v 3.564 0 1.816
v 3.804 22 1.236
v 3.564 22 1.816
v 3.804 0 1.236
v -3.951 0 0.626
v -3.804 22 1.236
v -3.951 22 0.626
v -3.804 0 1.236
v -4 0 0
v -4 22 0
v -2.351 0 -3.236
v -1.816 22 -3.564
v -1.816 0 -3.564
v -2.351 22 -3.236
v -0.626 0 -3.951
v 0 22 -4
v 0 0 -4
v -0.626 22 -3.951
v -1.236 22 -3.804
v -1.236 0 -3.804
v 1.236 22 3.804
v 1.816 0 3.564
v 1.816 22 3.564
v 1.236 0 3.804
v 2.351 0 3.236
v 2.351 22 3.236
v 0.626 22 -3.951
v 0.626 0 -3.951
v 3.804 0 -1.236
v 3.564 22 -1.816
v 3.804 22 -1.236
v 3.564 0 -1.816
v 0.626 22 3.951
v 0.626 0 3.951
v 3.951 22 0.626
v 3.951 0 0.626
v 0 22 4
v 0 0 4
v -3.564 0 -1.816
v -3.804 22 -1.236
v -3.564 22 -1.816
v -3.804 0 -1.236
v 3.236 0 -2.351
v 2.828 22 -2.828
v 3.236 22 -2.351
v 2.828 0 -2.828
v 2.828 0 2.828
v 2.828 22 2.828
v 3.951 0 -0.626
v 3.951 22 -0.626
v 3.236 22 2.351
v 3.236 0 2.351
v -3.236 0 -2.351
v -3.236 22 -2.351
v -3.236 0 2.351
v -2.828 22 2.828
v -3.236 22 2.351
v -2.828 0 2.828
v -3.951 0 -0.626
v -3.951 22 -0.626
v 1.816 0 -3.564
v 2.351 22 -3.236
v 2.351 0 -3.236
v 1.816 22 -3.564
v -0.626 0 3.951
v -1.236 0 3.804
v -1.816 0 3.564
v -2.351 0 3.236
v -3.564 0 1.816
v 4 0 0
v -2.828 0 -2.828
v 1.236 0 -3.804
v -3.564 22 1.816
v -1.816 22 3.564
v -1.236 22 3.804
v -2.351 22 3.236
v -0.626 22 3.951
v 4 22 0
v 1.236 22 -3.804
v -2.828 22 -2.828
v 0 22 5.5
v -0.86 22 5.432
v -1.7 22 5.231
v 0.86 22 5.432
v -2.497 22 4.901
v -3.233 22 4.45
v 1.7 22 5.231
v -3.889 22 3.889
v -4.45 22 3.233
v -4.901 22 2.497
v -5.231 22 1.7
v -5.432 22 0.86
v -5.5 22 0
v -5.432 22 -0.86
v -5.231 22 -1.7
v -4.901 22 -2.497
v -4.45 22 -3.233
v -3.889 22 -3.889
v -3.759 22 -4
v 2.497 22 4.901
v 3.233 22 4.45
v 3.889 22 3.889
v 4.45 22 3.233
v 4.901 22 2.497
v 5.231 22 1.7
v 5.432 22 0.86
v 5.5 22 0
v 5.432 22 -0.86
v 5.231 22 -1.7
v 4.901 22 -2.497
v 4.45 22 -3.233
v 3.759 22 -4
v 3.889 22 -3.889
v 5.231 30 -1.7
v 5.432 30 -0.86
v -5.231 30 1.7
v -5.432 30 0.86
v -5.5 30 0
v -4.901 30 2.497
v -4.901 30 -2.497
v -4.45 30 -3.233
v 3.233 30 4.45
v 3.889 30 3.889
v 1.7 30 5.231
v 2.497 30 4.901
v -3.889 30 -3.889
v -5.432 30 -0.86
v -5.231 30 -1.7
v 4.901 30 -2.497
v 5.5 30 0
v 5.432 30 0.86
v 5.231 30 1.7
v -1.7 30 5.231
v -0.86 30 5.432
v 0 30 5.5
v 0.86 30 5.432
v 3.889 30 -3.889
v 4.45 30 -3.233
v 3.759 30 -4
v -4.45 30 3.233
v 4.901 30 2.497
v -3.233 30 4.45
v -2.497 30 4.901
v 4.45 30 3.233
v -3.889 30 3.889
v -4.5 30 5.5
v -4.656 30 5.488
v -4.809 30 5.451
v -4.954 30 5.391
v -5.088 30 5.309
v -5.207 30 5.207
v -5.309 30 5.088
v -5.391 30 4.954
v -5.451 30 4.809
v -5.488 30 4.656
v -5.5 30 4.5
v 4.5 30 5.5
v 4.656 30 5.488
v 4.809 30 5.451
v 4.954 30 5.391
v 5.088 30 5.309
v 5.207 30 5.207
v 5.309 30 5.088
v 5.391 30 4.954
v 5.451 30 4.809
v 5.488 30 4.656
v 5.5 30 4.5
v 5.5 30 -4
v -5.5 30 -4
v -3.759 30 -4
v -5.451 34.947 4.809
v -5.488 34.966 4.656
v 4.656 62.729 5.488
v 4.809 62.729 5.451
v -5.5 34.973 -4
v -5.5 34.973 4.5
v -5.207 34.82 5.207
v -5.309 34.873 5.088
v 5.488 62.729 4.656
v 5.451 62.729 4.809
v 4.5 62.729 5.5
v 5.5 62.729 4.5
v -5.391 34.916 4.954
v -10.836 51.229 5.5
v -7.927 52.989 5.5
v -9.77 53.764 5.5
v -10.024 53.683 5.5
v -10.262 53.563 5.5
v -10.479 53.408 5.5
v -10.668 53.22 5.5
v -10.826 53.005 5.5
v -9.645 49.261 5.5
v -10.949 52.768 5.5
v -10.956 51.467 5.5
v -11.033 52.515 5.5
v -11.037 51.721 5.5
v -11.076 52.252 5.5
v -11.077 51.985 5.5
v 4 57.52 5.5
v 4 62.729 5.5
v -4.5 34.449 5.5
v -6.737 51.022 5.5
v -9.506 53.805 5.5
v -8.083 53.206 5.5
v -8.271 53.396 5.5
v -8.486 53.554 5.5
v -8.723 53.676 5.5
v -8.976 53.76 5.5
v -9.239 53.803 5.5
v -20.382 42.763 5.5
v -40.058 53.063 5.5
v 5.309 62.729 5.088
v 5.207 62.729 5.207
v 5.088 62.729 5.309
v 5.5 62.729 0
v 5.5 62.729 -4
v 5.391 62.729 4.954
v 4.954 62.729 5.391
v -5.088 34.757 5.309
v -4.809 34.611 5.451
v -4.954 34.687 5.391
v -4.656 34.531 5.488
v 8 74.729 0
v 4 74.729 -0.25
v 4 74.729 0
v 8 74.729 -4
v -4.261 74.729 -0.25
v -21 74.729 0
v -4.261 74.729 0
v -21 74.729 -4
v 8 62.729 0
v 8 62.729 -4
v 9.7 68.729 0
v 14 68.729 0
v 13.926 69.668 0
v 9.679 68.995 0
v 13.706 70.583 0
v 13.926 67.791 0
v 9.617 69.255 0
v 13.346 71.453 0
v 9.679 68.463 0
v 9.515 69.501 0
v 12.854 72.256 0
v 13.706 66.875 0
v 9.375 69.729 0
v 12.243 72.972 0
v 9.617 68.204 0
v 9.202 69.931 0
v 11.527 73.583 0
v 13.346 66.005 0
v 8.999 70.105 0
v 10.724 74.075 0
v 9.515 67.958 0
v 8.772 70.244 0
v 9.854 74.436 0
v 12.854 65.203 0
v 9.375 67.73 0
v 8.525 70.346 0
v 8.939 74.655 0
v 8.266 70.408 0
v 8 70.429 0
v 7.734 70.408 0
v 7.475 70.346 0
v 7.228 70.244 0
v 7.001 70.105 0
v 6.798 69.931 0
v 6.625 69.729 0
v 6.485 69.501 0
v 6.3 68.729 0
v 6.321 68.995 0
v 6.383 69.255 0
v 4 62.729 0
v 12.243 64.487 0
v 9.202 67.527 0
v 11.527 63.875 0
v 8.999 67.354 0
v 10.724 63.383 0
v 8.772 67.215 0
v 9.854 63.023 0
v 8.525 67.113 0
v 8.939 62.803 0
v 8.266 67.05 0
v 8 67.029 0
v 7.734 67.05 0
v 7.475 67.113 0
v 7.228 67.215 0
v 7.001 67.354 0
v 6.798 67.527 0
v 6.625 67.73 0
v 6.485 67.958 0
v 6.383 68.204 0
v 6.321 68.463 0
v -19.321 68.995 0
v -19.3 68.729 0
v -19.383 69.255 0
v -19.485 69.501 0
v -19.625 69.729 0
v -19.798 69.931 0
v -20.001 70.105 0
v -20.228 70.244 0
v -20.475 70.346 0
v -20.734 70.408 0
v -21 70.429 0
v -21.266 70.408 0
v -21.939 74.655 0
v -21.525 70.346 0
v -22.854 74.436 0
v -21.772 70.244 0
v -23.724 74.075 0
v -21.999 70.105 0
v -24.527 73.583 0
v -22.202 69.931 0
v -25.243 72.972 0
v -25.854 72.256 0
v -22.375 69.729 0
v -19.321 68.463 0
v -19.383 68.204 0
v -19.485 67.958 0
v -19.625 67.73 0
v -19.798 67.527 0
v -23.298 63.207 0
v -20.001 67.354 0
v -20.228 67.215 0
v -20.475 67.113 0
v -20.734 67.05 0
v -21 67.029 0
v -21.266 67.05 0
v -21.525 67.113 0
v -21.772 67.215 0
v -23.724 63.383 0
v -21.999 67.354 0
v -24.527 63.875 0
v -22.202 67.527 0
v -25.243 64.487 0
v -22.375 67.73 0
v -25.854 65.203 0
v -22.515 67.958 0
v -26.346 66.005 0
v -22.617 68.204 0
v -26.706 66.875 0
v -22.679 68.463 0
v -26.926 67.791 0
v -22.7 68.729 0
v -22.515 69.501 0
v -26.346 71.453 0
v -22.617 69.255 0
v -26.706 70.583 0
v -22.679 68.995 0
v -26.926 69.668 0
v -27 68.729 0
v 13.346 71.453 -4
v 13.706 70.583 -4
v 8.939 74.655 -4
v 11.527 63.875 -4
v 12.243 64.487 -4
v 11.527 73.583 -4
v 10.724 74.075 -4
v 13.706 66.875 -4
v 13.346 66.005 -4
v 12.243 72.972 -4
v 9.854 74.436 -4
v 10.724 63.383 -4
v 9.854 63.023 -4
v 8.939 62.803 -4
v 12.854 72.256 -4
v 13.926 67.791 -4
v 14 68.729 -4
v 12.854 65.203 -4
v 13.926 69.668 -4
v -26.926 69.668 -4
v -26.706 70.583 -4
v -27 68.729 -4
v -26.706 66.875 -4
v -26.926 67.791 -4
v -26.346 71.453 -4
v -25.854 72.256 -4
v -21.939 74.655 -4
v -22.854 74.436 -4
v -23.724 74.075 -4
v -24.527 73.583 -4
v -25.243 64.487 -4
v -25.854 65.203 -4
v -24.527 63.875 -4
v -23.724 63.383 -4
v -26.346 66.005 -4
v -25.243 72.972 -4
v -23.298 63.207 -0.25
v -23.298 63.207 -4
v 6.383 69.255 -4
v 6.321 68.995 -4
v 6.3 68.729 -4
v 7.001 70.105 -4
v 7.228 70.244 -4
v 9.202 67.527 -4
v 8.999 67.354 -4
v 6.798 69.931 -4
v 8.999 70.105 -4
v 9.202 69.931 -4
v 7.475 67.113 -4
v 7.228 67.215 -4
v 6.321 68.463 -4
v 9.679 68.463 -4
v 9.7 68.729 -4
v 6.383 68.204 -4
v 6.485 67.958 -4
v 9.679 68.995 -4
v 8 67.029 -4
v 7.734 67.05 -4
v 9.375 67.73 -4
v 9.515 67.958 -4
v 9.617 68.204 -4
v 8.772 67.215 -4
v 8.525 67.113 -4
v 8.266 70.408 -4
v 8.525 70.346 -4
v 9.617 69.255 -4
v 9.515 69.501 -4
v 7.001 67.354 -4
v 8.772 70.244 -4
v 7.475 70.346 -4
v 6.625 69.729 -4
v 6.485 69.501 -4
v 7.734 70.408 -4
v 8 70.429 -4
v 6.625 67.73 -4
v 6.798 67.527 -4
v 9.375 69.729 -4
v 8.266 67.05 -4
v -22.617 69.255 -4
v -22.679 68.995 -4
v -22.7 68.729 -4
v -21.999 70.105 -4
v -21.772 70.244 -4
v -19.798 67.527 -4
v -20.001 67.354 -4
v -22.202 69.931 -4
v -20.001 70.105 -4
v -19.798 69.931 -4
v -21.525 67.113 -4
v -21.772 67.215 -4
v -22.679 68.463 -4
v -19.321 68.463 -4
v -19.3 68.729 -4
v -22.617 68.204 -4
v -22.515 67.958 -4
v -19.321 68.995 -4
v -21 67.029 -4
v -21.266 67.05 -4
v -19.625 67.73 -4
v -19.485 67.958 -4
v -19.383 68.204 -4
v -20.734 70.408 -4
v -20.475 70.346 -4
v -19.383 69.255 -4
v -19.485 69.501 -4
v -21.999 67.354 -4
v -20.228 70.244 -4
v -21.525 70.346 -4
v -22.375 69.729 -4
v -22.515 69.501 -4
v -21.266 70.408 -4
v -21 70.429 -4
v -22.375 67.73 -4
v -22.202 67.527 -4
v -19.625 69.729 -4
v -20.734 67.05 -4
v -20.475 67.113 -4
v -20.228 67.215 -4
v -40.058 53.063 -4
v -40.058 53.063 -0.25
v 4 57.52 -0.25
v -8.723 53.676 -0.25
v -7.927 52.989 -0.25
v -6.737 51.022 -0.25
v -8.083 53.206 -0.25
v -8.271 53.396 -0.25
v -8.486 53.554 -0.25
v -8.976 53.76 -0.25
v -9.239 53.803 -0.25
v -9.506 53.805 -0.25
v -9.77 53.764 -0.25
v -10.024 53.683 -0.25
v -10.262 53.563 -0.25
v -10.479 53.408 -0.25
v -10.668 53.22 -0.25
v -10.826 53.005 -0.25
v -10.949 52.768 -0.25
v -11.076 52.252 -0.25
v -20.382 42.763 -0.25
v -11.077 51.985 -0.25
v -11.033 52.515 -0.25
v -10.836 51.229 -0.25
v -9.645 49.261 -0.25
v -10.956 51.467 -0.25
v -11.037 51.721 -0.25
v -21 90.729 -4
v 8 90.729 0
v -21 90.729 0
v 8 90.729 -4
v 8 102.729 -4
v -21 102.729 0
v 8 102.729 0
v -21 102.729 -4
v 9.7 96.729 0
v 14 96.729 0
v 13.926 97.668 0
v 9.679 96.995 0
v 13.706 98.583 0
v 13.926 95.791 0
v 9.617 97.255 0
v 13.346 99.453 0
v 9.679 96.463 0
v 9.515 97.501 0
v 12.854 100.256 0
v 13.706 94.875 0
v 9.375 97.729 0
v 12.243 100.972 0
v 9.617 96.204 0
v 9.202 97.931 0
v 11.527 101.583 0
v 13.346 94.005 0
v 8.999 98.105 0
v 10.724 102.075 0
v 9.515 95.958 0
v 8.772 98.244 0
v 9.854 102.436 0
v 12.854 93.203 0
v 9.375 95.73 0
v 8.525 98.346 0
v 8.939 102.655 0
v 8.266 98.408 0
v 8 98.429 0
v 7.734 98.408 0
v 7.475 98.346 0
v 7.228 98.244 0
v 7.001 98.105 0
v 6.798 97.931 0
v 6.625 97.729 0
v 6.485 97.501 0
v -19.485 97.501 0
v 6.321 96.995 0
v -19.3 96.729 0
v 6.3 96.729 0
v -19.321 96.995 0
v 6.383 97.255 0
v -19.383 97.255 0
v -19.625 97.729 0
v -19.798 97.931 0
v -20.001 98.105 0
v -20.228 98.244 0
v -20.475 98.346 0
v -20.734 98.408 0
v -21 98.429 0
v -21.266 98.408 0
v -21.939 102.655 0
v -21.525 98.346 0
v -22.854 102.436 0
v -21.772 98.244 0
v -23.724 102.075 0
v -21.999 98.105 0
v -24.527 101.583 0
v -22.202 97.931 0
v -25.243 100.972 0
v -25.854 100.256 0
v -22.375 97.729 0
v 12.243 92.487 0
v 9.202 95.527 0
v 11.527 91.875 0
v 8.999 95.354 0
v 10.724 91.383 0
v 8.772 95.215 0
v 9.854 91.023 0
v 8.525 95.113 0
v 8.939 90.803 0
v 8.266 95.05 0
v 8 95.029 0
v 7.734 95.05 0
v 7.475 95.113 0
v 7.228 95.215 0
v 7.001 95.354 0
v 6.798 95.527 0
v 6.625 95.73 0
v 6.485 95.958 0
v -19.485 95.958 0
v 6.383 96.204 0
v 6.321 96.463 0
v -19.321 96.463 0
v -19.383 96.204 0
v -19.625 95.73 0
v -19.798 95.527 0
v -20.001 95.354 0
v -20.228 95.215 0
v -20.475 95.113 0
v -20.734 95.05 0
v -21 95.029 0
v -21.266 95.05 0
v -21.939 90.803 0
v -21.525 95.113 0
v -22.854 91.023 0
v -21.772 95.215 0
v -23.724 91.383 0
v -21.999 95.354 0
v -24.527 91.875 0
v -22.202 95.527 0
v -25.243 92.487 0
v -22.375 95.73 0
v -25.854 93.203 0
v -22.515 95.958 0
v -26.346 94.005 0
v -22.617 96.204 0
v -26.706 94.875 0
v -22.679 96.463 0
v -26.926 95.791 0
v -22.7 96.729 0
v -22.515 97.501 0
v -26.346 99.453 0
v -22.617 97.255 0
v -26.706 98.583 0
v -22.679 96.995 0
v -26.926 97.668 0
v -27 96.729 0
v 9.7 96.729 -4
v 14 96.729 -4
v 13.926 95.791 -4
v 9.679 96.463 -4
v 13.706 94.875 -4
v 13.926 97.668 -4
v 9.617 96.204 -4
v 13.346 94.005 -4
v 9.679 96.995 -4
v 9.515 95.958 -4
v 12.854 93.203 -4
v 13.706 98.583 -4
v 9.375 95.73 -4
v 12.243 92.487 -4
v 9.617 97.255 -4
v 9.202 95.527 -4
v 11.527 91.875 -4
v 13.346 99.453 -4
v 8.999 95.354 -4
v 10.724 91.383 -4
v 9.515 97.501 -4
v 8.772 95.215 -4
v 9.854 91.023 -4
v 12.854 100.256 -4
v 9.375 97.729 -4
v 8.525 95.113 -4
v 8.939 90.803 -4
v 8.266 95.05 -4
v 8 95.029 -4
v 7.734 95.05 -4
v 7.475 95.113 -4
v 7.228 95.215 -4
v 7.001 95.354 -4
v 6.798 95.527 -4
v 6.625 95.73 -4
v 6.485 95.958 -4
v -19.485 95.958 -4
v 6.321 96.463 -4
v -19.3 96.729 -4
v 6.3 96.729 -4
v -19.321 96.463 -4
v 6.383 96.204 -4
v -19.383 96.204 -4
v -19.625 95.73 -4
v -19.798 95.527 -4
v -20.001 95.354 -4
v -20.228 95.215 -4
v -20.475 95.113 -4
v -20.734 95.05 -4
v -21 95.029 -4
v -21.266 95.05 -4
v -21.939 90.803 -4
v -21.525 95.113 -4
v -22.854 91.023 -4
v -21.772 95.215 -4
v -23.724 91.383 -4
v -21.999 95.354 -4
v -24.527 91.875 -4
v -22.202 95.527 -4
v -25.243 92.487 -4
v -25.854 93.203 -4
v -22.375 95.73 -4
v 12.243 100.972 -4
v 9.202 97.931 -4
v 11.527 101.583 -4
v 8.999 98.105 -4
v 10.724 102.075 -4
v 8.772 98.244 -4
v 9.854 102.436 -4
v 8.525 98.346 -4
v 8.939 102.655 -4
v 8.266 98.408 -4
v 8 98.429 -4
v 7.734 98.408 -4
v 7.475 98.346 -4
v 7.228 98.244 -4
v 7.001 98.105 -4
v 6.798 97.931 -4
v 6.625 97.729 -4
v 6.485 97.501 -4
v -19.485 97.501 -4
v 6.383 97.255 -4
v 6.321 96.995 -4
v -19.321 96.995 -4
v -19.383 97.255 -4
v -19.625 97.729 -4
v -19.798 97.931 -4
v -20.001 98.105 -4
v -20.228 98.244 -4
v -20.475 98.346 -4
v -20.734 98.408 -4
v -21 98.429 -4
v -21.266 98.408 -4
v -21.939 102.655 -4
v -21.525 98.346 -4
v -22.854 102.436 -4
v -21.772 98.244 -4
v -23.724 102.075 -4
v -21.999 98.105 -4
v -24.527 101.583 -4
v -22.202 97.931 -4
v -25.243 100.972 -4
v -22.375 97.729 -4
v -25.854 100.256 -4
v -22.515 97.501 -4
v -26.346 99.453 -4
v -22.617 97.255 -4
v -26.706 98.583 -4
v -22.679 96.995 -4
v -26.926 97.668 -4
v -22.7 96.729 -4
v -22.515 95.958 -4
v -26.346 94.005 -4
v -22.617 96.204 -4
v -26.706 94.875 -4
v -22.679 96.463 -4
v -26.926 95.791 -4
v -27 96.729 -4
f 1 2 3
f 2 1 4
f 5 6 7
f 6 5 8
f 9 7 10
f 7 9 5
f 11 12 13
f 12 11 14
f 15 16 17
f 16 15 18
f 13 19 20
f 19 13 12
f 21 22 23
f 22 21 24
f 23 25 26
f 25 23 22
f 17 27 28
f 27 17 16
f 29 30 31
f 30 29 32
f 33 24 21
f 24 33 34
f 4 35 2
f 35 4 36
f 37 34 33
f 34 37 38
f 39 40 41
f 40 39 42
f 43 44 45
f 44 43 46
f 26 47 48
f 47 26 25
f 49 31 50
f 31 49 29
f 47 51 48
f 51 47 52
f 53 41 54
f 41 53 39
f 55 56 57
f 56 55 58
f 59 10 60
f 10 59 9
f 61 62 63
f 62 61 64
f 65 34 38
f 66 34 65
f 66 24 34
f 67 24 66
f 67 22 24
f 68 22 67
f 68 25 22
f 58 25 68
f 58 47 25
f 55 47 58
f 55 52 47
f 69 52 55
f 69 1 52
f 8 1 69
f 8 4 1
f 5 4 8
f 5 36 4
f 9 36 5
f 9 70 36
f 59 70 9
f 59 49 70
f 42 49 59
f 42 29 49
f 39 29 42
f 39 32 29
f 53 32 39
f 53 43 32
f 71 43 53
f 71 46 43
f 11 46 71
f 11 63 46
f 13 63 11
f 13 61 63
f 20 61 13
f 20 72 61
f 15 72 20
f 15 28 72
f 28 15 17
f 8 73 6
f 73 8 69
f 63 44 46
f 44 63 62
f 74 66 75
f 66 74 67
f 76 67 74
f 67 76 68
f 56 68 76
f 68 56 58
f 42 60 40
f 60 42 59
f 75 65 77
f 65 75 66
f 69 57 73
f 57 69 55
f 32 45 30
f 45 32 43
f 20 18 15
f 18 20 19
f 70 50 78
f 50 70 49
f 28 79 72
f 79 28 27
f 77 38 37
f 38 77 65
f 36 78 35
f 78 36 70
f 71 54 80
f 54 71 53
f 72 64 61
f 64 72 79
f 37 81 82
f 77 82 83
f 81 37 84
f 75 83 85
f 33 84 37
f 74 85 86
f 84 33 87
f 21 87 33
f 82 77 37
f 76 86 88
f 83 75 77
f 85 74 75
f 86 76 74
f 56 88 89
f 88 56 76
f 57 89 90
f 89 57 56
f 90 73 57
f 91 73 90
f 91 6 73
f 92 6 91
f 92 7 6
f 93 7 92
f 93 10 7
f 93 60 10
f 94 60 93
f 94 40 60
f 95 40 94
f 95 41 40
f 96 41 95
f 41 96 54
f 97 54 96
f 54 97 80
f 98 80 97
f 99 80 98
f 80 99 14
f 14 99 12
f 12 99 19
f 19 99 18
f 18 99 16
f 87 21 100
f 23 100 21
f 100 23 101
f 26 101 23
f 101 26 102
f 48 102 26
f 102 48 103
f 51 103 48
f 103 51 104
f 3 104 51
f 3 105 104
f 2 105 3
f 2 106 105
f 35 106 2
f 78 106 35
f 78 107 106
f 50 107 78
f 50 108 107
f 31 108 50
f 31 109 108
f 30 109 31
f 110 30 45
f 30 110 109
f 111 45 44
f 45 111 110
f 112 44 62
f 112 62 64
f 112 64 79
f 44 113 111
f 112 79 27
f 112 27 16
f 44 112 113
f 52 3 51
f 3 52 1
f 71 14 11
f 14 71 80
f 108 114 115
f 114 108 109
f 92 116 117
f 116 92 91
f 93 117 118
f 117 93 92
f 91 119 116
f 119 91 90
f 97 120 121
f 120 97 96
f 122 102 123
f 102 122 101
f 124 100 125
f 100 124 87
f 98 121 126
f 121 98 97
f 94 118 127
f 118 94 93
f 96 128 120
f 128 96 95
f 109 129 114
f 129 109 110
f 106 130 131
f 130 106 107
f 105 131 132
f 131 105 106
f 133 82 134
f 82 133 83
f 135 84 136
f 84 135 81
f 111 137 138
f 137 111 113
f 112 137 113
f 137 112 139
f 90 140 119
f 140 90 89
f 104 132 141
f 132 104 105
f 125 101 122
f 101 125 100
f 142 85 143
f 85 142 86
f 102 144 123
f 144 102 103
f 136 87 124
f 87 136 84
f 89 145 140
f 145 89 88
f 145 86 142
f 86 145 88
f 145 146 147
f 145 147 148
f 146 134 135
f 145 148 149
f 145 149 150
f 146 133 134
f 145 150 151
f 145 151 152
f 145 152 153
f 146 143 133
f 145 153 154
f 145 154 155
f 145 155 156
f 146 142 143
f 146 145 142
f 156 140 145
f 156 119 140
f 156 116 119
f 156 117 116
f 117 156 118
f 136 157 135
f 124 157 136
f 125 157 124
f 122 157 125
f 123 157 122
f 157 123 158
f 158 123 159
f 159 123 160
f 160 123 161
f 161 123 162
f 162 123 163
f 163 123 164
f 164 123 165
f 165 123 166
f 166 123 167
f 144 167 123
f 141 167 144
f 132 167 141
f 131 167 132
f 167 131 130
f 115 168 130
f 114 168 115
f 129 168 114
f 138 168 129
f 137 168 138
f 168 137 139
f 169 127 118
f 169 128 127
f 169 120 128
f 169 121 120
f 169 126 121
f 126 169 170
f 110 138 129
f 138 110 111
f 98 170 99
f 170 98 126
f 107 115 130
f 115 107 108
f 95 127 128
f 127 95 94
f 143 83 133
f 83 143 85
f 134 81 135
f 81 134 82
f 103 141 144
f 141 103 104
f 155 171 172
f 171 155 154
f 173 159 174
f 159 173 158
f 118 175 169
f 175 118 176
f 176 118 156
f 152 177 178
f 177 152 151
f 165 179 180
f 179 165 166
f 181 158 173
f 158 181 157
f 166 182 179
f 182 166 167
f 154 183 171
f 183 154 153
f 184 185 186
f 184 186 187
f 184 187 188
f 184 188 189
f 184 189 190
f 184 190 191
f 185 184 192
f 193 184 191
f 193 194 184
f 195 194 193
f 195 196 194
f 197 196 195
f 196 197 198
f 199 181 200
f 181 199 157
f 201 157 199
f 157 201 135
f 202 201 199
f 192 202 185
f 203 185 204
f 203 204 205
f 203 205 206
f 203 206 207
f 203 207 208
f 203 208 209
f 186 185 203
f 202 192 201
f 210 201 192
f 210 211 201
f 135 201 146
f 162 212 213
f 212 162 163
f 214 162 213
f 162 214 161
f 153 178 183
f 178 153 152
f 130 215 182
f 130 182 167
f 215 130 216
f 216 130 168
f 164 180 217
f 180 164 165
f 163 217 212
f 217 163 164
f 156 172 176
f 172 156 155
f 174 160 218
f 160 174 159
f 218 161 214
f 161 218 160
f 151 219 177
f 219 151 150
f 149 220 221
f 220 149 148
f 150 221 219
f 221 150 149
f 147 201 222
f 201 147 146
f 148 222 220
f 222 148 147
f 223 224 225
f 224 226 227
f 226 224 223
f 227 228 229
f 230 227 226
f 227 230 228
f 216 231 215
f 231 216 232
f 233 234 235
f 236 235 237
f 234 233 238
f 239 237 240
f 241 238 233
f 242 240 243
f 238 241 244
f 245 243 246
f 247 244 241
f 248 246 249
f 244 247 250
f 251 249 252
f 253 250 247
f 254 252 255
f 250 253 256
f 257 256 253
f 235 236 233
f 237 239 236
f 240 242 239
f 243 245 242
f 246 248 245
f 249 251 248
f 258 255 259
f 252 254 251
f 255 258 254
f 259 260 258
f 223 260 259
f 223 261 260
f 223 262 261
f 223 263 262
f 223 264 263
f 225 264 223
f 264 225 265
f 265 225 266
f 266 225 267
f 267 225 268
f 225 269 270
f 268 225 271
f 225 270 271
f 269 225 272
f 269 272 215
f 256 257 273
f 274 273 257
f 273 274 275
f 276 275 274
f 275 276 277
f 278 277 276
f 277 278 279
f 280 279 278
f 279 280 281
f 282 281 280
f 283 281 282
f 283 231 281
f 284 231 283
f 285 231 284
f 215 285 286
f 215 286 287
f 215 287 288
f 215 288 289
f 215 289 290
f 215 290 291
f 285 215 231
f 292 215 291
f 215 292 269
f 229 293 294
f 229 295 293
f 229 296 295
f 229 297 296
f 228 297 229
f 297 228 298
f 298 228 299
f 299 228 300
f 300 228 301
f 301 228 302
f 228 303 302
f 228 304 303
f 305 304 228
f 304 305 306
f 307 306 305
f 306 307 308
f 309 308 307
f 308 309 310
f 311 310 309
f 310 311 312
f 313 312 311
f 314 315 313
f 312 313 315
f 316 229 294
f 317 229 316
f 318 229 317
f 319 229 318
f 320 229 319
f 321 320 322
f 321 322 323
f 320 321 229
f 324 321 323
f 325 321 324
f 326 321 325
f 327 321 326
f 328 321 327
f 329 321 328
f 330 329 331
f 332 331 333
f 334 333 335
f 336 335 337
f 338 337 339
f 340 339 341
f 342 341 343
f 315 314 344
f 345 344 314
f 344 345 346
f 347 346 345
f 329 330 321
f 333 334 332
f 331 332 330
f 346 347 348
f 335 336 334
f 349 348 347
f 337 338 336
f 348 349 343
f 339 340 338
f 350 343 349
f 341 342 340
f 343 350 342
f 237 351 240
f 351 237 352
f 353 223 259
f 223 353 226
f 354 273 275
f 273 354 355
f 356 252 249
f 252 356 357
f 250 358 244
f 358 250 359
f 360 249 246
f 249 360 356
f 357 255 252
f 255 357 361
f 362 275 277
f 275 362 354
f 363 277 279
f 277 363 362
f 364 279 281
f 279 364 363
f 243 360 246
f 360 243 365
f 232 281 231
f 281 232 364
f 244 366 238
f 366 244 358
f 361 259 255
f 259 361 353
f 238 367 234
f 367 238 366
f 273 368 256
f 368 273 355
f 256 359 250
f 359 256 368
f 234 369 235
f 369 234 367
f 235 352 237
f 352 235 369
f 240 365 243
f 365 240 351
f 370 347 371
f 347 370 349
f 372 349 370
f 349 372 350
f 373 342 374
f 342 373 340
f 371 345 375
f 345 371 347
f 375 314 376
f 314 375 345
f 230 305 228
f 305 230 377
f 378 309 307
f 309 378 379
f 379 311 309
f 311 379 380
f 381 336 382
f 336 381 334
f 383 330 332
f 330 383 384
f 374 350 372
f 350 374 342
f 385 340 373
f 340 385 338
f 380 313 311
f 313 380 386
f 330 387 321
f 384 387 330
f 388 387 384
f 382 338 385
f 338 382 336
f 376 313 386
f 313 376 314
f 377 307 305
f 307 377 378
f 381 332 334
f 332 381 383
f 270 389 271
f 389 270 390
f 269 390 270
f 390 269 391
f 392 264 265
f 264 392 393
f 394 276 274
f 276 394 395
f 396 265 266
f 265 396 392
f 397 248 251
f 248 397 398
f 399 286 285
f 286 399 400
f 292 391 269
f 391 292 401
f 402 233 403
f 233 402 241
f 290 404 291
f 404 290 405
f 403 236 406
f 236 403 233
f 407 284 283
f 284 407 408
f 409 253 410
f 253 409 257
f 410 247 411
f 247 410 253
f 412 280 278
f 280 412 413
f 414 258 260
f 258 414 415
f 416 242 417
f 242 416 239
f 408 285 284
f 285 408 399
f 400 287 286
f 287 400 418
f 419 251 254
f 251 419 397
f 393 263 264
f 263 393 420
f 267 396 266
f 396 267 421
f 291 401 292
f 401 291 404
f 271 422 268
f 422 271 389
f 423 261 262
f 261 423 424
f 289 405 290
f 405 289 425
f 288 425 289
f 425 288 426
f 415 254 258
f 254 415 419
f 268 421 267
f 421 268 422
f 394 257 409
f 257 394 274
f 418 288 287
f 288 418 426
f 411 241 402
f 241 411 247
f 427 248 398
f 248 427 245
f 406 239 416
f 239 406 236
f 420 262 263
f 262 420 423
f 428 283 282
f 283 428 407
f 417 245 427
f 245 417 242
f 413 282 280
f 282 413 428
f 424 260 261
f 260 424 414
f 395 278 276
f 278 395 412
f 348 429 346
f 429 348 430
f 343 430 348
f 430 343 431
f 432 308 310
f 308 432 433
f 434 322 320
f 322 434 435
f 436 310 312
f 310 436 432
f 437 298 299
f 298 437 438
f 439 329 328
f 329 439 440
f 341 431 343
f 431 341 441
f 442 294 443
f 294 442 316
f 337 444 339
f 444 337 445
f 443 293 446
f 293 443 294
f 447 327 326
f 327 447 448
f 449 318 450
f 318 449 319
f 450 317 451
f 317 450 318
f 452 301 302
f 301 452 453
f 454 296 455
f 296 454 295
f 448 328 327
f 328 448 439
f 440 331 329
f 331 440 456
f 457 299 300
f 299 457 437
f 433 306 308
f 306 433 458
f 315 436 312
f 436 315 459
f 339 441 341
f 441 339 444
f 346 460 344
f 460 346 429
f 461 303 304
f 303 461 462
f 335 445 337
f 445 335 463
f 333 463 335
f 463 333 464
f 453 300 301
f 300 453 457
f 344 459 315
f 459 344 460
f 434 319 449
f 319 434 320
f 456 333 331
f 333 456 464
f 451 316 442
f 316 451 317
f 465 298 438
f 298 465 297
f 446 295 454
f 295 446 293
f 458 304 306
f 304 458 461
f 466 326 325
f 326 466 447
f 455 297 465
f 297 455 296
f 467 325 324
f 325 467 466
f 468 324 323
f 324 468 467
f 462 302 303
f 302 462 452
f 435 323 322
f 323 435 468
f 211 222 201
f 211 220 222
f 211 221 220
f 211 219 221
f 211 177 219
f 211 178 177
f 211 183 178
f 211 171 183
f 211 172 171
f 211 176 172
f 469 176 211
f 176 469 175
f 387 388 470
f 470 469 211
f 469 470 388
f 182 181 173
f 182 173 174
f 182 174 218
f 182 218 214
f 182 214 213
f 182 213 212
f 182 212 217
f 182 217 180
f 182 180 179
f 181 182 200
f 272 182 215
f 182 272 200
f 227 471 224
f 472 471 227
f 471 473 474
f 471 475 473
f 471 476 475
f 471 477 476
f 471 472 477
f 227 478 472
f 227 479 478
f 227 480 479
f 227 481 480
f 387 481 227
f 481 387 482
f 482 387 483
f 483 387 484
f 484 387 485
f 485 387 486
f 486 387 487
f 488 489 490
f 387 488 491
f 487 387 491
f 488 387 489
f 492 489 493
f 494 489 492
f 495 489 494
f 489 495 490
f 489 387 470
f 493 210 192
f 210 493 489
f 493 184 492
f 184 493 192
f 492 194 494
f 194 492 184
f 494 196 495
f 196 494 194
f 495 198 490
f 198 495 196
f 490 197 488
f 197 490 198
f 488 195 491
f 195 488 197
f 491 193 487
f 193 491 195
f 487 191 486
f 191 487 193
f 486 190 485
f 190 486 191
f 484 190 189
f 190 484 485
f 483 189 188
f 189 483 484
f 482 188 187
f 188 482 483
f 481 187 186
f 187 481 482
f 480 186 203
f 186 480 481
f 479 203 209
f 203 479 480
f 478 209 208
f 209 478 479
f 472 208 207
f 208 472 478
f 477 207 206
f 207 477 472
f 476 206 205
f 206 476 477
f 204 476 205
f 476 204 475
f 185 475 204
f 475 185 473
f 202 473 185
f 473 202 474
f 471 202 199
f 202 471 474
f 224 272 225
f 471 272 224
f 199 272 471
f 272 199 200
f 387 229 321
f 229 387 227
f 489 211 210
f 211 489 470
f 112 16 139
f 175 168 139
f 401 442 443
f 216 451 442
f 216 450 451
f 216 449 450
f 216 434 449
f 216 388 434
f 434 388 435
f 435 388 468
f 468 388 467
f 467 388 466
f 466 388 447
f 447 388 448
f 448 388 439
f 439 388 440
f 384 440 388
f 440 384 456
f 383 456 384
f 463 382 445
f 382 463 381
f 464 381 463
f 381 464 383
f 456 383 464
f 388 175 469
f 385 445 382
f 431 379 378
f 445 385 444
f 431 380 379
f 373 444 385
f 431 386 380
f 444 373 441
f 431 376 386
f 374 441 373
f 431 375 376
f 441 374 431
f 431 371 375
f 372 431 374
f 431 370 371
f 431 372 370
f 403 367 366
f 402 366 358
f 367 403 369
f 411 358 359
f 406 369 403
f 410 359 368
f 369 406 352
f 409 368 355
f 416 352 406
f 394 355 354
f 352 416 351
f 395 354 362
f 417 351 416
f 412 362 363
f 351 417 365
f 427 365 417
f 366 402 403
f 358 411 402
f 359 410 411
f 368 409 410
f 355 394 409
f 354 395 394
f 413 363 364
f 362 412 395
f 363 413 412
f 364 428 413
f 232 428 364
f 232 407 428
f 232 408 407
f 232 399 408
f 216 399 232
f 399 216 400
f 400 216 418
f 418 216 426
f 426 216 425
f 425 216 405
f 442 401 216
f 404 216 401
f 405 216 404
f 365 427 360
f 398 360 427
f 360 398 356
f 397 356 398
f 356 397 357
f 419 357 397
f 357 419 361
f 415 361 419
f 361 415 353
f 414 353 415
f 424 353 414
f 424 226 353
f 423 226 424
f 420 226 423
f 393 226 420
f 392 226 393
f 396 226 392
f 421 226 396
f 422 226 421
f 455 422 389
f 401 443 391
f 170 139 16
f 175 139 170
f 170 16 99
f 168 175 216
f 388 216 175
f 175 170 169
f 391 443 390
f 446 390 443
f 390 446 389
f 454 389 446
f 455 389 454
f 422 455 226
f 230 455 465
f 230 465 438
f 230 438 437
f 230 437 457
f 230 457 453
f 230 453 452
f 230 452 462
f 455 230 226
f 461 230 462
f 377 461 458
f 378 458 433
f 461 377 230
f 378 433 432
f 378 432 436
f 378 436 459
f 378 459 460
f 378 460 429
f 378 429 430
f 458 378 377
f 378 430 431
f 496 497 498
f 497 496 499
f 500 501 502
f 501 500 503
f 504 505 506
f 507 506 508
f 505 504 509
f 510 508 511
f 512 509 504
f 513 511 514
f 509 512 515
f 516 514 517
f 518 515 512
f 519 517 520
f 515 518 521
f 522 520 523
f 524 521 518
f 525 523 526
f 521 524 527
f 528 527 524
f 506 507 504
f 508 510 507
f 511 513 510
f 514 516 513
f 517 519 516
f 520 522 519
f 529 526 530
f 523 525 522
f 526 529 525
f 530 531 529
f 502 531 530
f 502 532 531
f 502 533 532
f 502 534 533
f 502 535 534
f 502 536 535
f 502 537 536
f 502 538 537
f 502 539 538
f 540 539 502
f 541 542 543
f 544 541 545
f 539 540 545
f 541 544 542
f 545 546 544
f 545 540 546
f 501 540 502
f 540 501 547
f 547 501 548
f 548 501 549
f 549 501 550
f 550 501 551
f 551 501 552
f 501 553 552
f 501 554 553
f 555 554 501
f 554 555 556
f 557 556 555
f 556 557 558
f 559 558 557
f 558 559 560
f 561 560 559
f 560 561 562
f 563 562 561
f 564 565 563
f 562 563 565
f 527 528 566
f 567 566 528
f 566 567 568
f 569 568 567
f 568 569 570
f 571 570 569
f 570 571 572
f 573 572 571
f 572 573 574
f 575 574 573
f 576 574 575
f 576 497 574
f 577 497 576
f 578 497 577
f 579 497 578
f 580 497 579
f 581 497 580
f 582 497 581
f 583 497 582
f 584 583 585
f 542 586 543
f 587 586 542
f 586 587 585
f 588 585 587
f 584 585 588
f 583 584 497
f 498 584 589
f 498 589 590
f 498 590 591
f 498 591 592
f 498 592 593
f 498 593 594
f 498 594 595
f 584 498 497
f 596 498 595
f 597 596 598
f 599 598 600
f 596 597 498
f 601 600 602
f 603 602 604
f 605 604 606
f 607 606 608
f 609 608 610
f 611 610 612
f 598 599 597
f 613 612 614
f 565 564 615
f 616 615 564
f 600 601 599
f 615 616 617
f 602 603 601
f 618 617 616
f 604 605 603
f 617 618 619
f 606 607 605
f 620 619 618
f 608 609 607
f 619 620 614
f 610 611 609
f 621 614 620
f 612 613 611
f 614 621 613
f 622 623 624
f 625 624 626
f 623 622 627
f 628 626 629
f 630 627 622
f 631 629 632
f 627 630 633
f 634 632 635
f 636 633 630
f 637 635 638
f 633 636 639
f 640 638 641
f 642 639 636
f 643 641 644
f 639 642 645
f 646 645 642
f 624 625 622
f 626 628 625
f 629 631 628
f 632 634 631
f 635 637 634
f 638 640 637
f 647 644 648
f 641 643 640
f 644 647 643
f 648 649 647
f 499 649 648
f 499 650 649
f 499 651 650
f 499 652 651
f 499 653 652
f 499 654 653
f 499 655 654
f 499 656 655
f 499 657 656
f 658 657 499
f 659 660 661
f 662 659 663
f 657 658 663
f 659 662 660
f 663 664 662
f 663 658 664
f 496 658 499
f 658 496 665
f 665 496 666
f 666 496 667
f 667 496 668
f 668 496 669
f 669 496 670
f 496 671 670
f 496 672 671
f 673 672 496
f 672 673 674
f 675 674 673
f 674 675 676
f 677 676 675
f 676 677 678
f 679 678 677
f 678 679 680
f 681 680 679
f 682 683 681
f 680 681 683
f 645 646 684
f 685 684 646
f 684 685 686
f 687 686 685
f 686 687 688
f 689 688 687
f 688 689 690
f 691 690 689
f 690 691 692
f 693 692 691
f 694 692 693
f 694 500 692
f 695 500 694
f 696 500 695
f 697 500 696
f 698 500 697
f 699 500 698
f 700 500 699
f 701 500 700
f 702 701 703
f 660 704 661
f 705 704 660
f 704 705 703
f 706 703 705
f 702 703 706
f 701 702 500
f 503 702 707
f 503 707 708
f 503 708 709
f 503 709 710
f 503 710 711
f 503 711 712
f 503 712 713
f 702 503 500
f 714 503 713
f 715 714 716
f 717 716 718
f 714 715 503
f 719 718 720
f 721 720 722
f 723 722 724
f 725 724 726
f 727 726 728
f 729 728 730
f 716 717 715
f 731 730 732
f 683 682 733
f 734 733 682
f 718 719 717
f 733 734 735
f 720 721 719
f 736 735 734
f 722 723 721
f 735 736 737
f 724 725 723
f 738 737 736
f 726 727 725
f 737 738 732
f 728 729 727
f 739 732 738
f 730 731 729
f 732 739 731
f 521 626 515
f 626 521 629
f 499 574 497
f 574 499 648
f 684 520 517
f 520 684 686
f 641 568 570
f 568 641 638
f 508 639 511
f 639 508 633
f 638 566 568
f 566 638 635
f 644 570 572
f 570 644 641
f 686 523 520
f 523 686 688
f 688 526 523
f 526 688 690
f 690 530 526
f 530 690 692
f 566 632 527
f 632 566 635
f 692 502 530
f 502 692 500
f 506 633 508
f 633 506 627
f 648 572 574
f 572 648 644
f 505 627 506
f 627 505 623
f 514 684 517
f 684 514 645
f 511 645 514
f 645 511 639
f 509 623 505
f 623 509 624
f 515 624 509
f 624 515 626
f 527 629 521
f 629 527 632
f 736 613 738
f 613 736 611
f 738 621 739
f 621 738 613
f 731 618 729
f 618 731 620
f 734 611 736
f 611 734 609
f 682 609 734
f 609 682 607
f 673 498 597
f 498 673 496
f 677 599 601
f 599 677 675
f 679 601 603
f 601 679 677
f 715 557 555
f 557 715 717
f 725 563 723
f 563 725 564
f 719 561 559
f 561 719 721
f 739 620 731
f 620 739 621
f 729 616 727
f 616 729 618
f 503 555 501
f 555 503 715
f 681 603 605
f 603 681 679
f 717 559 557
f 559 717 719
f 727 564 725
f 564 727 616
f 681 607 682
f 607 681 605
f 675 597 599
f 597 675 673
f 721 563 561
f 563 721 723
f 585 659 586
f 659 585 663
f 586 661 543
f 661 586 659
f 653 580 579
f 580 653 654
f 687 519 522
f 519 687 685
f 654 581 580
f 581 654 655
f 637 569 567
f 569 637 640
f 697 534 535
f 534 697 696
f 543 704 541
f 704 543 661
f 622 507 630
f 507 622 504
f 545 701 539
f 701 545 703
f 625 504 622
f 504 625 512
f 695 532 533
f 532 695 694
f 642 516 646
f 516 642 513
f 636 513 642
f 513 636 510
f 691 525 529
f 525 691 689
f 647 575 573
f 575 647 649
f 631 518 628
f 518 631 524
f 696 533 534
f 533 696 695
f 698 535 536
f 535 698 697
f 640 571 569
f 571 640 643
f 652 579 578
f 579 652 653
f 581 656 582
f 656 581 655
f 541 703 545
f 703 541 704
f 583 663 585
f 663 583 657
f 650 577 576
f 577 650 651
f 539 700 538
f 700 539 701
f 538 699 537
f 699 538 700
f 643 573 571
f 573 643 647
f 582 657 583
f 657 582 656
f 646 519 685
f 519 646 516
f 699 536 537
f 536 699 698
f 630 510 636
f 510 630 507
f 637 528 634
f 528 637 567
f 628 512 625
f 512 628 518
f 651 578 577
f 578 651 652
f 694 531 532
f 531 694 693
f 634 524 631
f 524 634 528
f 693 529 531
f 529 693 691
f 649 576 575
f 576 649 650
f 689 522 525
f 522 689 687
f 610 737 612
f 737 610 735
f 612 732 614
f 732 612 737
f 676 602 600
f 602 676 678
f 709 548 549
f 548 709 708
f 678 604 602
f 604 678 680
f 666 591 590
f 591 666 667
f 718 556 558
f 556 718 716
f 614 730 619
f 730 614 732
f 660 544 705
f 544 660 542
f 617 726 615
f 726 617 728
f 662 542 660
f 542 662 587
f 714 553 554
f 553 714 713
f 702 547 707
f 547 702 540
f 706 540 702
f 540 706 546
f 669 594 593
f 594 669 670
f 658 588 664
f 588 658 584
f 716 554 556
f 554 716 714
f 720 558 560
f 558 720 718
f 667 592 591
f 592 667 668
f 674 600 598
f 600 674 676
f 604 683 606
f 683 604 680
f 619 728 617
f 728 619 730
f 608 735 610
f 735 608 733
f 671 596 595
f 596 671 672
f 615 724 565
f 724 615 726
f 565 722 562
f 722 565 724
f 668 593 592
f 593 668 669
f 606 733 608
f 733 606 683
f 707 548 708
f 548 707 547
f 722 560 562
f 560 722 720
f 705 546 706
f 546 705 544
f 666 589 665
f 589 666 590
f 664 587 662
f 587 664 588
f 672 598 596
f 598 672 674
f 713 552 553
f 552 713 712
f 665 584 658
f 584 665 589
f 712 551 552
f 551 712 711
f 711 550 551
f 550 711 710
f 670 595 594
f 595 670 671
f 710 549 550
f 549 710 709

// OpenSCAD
// preview[view:north, tilt:top]
/* [Axle] */
// Diameter of the holder axle in mm
AxleDiameter=8;
// Length of the holder axle in mm
AxleLength=22;
// Diameter for the axle stop in mm
AxleStopDiameter=11;
// Axle stop length in mm
AxleStopLength=8;

/* [Knife] */
// Knife blade hight in mm
KnifeHeight=19;
// Knife blade length in mm
KnifeBladeLength=51.5;
// Knife upper length in mm
KnifeUpperLength=28.5;
// Knife thickness in mm
KnifeThickness=0.5;

// Knife bump position from center in mm  +/-
KnifeBumpPositionFromCenter=0;
// Knife bump width in mm
KnifeBumpWidth=3.4;
// Knife bump depth in mm
KnifeBumpDepth=4.0;

// Knife clearance (cutting part) in mm
KnifeClearance=5;
// Knife offset from center in mm
KnifeOffsetFromCenter=4;

/* [Clamp] */
// Clamp screw diameter in mm
ClampScrewDiameter=3;
// Clamp thickness in mm
ClampThickness=4;

/* [Export] */
// 1 flattens the back to print without support
WithoutSupport=1;//[0,1]

// 1 rotates to x axes for printer output
RotateForExport=1;//[0,1]


/* [Hidden] */
$fn=40;

//calculate triangle
a=(KnifeBladeLength/2)-(KnifeUpperLength/2);
b=KnifeHeight;
c=sqrt(pow(a,2)+pow(b,2));
echo(c);
alpha=90-asin(a/c);
echo(alpha);
//gamma
gamma=180-2*alpha;
echo(gamma);
//
triangleSide=(KnifeBladeLength/sin(gamma/2))/2;
echo(triangleSide);
//
pointBalpha=90-alpha;
echo(pointBalpha);
pointBa=sin(pointBalpha)*KnifeBladeLength;
echo(pointBa);
pointBb=sqrt(pow(KnifeBladeLength,2)-pow(pointBa,2));
echo("PointBb ",pointBb);

//Knife
module Knife(){
Knife0=[[0,0],[KnifeBladeLength,0],[KnifeUpperLength+a,KnifeHeight],[a,KnifeHeight]];
Knife0Path=[0,1,2,3];
KnifeBump0=[[a+(KnifeUpperLength/2)+(KnifeBumpWidth/2)+KnifeBumpPositionFromCenter,KnifeHeight],[a+(KnifeUpperLength/2)+(KnifeBumpWidth/2)+KnifeBumpPositionFromCenter,KnifeHeight-KnifeBumpDepth+KnifeBumpWidth/2],[a+(KnifeUpperLength/2)-(KnifeBumpWidth/2)+KnifeBumpPositionFromCenter,KnifeHeight-KnifeBumpDepth+KnifeBumpWidth/2],[a+(KnifeUpperLength/2)-(KnifeBumpWidth/2)+KnifeBumpPositionFromCenter,KnifeHeight]];
KnifeBump0Path=[4,5,6,7];
//KnifeBump1=
KnifeBump1Path=[8,9,10,11,12,13,14,15,16,17,18,19];
Knife=concat(Knife0,KnifeBump0);
KnifePath=[Knife0Path,KnifeBump0Path];
translate([-KnifeOffsetFromCenter,-KnifeThickness/2,AxleLength+AxleStopLength+cubeHeigth+triangleSide])
rotate([-90,90-alpha,0])
linear_extrude(height=AxleStopDiameter)
difference(){
polygon(Knife,KnifePath);
translate([a+(KnifeUpperLength/2)+KnifeBumpPositionFromCenter,KnifeHeight-KnifeBumpDepth+KnifeBumpWidth/2,0]) circle(KnifeBumpWidth/2,$fn12);
}
//#polygon(points=[[0,0],[KnifeBladeLength,0],[KnifeUpperLength+a,KnifeHeight],[a+(KnifeUpperLength/2)+(KnifeBumpWidth/2),KnifeHeight],[a+(KnifeUpperLength/2)+(KnifeBumpWidth/2),KnifeHeight-KnifeBumpDepth],[a+(KnifeUpperLength/2)-(KnifeBumpWidth/2),KnifeHeight-KnifeBumpDepth],[a+(KnifeUpperLength/2)-(KnifeBumpWidth/2),KnifeHeight],[a,KnifeHeight]]);
}

cubeHeigth=0;

//Axle
module Axle(){
cylinder(r=AxleDiameter/2,h=AxleLength);
translate([0,0,AxleLength])
cylinder(r=AxleStopDiameter/2,h=AxleStopLength);
translate([0,0,AxleLength+AxleStopLength+(cubeHeigth+triangleSide-KnifeClearance)/2])
minkowski(){
cube([AxleStopDiameter-2,AxleStopDiameter-2,cubeHeigth+triangleSide-KnifeClearance],center=true);
translate([0,0,0])
cylinder(r=1,h=1);
}}
//KnifeHolder
module KnifeHolder(){
translate([-KnifeOffsetFromCenter,AxleStopDiameter/2,AxleLength+AxleStopLength+cubeHeigth])
rotate([90,0,0])
union(){
translate([pointBb-AxleStopDiameter/2+2,triangleSide-pointBa,AxleStopDiameter/2])
*sphere(r=AxleStopDiameter/2);
linear_extrude(height=AxleStopDiameter)
polygon(points=[[0,0],[pointBb,triangleSide-pointBa],[0,triangleSide]]);
}}

//KnifeClamp
module KnifeClamp(){
clampZPosition=AxleLength+AxleStopLength+(cubeHeigth+triangleSide-KnifeClearance)-12;
clampThickness=AxleStopDiameter/2;
clampHeight=12;
clampWidth=41-clampHeight;
clampXPosition=-4-KnifeOffsetFromCenter;
difference(){
    union(){
        translate([clampXPosition,-clampThickness,clampZPosition])
            cube([clampWidth,AxleStopDiameter/2,clampHeight]);
        translate([clampXPosition,0,clampZPosition+clampHeight/2])
            rotate([90,0,0])
            cylinder(r=clampHeight/2,h=clampThickness);
        translate([clampWidth+clampXPosition,0,clampZPosition+clampHeight/2])
            rotate([90,0,0])
            cylinder(r=clampHeight/2,h=clampThickness);}
    translate([clampXPosition,0,clampZPosition+clampHeight/2])
            rotate([90,0,0])
            cylinder(r=ClampScrewDiameter/2+0.2,h=clampThickness+1);
    translate([clampWidth+clampXPosition,0,clampZPosition+clampHeight/2])
            rotate([90,0,0])
            cylinder(r=ClampScrewDiameter/2+0.2,h=clampThickness+1);
}
}
module KnifeClamp2(){
    translate([0,-AxleStopDiameter/2+ClampThickness,(AxleLength+AxleStopLength+(cubeHeigth+triangleSide-KnifeClearance)-12)*2+40])
    mirror([0,0,1])
    resize([0,ClampThickness,0])
        KnifeClamp();
}
module DragKnifeRotor(){
union(){
difference(){
union(){
    Axle();
    KnifeHolder();
    KnifeClamp();
}
Knife();
translate([0,AxleStopDiameter/2,0]) KnifeClamp();
//cutout for printing without support (flatten the back)
if (WithoutSupport){translate([-100,-AxleDiameter/2,0])
rotate([90,0,0])
cube([200,200,AxleStopDiameter]);}
//cutout for freeing knife tip
translate([0,0,12]) KnifeClamp();
translate([0,AxleStopDiameter/2,12]) KnifeClamp();
}

if (WithoutSupport){translate([0,(AxleStopDiameter-AxleDiameter)/2,0])
KnifeClamp2();
}
else{KnifeClamp2();}
}
}
if(RotateForExport){rotate([-90,180,0])
DragKnifeRotor();
}
else {DragKnifeRotor();}
